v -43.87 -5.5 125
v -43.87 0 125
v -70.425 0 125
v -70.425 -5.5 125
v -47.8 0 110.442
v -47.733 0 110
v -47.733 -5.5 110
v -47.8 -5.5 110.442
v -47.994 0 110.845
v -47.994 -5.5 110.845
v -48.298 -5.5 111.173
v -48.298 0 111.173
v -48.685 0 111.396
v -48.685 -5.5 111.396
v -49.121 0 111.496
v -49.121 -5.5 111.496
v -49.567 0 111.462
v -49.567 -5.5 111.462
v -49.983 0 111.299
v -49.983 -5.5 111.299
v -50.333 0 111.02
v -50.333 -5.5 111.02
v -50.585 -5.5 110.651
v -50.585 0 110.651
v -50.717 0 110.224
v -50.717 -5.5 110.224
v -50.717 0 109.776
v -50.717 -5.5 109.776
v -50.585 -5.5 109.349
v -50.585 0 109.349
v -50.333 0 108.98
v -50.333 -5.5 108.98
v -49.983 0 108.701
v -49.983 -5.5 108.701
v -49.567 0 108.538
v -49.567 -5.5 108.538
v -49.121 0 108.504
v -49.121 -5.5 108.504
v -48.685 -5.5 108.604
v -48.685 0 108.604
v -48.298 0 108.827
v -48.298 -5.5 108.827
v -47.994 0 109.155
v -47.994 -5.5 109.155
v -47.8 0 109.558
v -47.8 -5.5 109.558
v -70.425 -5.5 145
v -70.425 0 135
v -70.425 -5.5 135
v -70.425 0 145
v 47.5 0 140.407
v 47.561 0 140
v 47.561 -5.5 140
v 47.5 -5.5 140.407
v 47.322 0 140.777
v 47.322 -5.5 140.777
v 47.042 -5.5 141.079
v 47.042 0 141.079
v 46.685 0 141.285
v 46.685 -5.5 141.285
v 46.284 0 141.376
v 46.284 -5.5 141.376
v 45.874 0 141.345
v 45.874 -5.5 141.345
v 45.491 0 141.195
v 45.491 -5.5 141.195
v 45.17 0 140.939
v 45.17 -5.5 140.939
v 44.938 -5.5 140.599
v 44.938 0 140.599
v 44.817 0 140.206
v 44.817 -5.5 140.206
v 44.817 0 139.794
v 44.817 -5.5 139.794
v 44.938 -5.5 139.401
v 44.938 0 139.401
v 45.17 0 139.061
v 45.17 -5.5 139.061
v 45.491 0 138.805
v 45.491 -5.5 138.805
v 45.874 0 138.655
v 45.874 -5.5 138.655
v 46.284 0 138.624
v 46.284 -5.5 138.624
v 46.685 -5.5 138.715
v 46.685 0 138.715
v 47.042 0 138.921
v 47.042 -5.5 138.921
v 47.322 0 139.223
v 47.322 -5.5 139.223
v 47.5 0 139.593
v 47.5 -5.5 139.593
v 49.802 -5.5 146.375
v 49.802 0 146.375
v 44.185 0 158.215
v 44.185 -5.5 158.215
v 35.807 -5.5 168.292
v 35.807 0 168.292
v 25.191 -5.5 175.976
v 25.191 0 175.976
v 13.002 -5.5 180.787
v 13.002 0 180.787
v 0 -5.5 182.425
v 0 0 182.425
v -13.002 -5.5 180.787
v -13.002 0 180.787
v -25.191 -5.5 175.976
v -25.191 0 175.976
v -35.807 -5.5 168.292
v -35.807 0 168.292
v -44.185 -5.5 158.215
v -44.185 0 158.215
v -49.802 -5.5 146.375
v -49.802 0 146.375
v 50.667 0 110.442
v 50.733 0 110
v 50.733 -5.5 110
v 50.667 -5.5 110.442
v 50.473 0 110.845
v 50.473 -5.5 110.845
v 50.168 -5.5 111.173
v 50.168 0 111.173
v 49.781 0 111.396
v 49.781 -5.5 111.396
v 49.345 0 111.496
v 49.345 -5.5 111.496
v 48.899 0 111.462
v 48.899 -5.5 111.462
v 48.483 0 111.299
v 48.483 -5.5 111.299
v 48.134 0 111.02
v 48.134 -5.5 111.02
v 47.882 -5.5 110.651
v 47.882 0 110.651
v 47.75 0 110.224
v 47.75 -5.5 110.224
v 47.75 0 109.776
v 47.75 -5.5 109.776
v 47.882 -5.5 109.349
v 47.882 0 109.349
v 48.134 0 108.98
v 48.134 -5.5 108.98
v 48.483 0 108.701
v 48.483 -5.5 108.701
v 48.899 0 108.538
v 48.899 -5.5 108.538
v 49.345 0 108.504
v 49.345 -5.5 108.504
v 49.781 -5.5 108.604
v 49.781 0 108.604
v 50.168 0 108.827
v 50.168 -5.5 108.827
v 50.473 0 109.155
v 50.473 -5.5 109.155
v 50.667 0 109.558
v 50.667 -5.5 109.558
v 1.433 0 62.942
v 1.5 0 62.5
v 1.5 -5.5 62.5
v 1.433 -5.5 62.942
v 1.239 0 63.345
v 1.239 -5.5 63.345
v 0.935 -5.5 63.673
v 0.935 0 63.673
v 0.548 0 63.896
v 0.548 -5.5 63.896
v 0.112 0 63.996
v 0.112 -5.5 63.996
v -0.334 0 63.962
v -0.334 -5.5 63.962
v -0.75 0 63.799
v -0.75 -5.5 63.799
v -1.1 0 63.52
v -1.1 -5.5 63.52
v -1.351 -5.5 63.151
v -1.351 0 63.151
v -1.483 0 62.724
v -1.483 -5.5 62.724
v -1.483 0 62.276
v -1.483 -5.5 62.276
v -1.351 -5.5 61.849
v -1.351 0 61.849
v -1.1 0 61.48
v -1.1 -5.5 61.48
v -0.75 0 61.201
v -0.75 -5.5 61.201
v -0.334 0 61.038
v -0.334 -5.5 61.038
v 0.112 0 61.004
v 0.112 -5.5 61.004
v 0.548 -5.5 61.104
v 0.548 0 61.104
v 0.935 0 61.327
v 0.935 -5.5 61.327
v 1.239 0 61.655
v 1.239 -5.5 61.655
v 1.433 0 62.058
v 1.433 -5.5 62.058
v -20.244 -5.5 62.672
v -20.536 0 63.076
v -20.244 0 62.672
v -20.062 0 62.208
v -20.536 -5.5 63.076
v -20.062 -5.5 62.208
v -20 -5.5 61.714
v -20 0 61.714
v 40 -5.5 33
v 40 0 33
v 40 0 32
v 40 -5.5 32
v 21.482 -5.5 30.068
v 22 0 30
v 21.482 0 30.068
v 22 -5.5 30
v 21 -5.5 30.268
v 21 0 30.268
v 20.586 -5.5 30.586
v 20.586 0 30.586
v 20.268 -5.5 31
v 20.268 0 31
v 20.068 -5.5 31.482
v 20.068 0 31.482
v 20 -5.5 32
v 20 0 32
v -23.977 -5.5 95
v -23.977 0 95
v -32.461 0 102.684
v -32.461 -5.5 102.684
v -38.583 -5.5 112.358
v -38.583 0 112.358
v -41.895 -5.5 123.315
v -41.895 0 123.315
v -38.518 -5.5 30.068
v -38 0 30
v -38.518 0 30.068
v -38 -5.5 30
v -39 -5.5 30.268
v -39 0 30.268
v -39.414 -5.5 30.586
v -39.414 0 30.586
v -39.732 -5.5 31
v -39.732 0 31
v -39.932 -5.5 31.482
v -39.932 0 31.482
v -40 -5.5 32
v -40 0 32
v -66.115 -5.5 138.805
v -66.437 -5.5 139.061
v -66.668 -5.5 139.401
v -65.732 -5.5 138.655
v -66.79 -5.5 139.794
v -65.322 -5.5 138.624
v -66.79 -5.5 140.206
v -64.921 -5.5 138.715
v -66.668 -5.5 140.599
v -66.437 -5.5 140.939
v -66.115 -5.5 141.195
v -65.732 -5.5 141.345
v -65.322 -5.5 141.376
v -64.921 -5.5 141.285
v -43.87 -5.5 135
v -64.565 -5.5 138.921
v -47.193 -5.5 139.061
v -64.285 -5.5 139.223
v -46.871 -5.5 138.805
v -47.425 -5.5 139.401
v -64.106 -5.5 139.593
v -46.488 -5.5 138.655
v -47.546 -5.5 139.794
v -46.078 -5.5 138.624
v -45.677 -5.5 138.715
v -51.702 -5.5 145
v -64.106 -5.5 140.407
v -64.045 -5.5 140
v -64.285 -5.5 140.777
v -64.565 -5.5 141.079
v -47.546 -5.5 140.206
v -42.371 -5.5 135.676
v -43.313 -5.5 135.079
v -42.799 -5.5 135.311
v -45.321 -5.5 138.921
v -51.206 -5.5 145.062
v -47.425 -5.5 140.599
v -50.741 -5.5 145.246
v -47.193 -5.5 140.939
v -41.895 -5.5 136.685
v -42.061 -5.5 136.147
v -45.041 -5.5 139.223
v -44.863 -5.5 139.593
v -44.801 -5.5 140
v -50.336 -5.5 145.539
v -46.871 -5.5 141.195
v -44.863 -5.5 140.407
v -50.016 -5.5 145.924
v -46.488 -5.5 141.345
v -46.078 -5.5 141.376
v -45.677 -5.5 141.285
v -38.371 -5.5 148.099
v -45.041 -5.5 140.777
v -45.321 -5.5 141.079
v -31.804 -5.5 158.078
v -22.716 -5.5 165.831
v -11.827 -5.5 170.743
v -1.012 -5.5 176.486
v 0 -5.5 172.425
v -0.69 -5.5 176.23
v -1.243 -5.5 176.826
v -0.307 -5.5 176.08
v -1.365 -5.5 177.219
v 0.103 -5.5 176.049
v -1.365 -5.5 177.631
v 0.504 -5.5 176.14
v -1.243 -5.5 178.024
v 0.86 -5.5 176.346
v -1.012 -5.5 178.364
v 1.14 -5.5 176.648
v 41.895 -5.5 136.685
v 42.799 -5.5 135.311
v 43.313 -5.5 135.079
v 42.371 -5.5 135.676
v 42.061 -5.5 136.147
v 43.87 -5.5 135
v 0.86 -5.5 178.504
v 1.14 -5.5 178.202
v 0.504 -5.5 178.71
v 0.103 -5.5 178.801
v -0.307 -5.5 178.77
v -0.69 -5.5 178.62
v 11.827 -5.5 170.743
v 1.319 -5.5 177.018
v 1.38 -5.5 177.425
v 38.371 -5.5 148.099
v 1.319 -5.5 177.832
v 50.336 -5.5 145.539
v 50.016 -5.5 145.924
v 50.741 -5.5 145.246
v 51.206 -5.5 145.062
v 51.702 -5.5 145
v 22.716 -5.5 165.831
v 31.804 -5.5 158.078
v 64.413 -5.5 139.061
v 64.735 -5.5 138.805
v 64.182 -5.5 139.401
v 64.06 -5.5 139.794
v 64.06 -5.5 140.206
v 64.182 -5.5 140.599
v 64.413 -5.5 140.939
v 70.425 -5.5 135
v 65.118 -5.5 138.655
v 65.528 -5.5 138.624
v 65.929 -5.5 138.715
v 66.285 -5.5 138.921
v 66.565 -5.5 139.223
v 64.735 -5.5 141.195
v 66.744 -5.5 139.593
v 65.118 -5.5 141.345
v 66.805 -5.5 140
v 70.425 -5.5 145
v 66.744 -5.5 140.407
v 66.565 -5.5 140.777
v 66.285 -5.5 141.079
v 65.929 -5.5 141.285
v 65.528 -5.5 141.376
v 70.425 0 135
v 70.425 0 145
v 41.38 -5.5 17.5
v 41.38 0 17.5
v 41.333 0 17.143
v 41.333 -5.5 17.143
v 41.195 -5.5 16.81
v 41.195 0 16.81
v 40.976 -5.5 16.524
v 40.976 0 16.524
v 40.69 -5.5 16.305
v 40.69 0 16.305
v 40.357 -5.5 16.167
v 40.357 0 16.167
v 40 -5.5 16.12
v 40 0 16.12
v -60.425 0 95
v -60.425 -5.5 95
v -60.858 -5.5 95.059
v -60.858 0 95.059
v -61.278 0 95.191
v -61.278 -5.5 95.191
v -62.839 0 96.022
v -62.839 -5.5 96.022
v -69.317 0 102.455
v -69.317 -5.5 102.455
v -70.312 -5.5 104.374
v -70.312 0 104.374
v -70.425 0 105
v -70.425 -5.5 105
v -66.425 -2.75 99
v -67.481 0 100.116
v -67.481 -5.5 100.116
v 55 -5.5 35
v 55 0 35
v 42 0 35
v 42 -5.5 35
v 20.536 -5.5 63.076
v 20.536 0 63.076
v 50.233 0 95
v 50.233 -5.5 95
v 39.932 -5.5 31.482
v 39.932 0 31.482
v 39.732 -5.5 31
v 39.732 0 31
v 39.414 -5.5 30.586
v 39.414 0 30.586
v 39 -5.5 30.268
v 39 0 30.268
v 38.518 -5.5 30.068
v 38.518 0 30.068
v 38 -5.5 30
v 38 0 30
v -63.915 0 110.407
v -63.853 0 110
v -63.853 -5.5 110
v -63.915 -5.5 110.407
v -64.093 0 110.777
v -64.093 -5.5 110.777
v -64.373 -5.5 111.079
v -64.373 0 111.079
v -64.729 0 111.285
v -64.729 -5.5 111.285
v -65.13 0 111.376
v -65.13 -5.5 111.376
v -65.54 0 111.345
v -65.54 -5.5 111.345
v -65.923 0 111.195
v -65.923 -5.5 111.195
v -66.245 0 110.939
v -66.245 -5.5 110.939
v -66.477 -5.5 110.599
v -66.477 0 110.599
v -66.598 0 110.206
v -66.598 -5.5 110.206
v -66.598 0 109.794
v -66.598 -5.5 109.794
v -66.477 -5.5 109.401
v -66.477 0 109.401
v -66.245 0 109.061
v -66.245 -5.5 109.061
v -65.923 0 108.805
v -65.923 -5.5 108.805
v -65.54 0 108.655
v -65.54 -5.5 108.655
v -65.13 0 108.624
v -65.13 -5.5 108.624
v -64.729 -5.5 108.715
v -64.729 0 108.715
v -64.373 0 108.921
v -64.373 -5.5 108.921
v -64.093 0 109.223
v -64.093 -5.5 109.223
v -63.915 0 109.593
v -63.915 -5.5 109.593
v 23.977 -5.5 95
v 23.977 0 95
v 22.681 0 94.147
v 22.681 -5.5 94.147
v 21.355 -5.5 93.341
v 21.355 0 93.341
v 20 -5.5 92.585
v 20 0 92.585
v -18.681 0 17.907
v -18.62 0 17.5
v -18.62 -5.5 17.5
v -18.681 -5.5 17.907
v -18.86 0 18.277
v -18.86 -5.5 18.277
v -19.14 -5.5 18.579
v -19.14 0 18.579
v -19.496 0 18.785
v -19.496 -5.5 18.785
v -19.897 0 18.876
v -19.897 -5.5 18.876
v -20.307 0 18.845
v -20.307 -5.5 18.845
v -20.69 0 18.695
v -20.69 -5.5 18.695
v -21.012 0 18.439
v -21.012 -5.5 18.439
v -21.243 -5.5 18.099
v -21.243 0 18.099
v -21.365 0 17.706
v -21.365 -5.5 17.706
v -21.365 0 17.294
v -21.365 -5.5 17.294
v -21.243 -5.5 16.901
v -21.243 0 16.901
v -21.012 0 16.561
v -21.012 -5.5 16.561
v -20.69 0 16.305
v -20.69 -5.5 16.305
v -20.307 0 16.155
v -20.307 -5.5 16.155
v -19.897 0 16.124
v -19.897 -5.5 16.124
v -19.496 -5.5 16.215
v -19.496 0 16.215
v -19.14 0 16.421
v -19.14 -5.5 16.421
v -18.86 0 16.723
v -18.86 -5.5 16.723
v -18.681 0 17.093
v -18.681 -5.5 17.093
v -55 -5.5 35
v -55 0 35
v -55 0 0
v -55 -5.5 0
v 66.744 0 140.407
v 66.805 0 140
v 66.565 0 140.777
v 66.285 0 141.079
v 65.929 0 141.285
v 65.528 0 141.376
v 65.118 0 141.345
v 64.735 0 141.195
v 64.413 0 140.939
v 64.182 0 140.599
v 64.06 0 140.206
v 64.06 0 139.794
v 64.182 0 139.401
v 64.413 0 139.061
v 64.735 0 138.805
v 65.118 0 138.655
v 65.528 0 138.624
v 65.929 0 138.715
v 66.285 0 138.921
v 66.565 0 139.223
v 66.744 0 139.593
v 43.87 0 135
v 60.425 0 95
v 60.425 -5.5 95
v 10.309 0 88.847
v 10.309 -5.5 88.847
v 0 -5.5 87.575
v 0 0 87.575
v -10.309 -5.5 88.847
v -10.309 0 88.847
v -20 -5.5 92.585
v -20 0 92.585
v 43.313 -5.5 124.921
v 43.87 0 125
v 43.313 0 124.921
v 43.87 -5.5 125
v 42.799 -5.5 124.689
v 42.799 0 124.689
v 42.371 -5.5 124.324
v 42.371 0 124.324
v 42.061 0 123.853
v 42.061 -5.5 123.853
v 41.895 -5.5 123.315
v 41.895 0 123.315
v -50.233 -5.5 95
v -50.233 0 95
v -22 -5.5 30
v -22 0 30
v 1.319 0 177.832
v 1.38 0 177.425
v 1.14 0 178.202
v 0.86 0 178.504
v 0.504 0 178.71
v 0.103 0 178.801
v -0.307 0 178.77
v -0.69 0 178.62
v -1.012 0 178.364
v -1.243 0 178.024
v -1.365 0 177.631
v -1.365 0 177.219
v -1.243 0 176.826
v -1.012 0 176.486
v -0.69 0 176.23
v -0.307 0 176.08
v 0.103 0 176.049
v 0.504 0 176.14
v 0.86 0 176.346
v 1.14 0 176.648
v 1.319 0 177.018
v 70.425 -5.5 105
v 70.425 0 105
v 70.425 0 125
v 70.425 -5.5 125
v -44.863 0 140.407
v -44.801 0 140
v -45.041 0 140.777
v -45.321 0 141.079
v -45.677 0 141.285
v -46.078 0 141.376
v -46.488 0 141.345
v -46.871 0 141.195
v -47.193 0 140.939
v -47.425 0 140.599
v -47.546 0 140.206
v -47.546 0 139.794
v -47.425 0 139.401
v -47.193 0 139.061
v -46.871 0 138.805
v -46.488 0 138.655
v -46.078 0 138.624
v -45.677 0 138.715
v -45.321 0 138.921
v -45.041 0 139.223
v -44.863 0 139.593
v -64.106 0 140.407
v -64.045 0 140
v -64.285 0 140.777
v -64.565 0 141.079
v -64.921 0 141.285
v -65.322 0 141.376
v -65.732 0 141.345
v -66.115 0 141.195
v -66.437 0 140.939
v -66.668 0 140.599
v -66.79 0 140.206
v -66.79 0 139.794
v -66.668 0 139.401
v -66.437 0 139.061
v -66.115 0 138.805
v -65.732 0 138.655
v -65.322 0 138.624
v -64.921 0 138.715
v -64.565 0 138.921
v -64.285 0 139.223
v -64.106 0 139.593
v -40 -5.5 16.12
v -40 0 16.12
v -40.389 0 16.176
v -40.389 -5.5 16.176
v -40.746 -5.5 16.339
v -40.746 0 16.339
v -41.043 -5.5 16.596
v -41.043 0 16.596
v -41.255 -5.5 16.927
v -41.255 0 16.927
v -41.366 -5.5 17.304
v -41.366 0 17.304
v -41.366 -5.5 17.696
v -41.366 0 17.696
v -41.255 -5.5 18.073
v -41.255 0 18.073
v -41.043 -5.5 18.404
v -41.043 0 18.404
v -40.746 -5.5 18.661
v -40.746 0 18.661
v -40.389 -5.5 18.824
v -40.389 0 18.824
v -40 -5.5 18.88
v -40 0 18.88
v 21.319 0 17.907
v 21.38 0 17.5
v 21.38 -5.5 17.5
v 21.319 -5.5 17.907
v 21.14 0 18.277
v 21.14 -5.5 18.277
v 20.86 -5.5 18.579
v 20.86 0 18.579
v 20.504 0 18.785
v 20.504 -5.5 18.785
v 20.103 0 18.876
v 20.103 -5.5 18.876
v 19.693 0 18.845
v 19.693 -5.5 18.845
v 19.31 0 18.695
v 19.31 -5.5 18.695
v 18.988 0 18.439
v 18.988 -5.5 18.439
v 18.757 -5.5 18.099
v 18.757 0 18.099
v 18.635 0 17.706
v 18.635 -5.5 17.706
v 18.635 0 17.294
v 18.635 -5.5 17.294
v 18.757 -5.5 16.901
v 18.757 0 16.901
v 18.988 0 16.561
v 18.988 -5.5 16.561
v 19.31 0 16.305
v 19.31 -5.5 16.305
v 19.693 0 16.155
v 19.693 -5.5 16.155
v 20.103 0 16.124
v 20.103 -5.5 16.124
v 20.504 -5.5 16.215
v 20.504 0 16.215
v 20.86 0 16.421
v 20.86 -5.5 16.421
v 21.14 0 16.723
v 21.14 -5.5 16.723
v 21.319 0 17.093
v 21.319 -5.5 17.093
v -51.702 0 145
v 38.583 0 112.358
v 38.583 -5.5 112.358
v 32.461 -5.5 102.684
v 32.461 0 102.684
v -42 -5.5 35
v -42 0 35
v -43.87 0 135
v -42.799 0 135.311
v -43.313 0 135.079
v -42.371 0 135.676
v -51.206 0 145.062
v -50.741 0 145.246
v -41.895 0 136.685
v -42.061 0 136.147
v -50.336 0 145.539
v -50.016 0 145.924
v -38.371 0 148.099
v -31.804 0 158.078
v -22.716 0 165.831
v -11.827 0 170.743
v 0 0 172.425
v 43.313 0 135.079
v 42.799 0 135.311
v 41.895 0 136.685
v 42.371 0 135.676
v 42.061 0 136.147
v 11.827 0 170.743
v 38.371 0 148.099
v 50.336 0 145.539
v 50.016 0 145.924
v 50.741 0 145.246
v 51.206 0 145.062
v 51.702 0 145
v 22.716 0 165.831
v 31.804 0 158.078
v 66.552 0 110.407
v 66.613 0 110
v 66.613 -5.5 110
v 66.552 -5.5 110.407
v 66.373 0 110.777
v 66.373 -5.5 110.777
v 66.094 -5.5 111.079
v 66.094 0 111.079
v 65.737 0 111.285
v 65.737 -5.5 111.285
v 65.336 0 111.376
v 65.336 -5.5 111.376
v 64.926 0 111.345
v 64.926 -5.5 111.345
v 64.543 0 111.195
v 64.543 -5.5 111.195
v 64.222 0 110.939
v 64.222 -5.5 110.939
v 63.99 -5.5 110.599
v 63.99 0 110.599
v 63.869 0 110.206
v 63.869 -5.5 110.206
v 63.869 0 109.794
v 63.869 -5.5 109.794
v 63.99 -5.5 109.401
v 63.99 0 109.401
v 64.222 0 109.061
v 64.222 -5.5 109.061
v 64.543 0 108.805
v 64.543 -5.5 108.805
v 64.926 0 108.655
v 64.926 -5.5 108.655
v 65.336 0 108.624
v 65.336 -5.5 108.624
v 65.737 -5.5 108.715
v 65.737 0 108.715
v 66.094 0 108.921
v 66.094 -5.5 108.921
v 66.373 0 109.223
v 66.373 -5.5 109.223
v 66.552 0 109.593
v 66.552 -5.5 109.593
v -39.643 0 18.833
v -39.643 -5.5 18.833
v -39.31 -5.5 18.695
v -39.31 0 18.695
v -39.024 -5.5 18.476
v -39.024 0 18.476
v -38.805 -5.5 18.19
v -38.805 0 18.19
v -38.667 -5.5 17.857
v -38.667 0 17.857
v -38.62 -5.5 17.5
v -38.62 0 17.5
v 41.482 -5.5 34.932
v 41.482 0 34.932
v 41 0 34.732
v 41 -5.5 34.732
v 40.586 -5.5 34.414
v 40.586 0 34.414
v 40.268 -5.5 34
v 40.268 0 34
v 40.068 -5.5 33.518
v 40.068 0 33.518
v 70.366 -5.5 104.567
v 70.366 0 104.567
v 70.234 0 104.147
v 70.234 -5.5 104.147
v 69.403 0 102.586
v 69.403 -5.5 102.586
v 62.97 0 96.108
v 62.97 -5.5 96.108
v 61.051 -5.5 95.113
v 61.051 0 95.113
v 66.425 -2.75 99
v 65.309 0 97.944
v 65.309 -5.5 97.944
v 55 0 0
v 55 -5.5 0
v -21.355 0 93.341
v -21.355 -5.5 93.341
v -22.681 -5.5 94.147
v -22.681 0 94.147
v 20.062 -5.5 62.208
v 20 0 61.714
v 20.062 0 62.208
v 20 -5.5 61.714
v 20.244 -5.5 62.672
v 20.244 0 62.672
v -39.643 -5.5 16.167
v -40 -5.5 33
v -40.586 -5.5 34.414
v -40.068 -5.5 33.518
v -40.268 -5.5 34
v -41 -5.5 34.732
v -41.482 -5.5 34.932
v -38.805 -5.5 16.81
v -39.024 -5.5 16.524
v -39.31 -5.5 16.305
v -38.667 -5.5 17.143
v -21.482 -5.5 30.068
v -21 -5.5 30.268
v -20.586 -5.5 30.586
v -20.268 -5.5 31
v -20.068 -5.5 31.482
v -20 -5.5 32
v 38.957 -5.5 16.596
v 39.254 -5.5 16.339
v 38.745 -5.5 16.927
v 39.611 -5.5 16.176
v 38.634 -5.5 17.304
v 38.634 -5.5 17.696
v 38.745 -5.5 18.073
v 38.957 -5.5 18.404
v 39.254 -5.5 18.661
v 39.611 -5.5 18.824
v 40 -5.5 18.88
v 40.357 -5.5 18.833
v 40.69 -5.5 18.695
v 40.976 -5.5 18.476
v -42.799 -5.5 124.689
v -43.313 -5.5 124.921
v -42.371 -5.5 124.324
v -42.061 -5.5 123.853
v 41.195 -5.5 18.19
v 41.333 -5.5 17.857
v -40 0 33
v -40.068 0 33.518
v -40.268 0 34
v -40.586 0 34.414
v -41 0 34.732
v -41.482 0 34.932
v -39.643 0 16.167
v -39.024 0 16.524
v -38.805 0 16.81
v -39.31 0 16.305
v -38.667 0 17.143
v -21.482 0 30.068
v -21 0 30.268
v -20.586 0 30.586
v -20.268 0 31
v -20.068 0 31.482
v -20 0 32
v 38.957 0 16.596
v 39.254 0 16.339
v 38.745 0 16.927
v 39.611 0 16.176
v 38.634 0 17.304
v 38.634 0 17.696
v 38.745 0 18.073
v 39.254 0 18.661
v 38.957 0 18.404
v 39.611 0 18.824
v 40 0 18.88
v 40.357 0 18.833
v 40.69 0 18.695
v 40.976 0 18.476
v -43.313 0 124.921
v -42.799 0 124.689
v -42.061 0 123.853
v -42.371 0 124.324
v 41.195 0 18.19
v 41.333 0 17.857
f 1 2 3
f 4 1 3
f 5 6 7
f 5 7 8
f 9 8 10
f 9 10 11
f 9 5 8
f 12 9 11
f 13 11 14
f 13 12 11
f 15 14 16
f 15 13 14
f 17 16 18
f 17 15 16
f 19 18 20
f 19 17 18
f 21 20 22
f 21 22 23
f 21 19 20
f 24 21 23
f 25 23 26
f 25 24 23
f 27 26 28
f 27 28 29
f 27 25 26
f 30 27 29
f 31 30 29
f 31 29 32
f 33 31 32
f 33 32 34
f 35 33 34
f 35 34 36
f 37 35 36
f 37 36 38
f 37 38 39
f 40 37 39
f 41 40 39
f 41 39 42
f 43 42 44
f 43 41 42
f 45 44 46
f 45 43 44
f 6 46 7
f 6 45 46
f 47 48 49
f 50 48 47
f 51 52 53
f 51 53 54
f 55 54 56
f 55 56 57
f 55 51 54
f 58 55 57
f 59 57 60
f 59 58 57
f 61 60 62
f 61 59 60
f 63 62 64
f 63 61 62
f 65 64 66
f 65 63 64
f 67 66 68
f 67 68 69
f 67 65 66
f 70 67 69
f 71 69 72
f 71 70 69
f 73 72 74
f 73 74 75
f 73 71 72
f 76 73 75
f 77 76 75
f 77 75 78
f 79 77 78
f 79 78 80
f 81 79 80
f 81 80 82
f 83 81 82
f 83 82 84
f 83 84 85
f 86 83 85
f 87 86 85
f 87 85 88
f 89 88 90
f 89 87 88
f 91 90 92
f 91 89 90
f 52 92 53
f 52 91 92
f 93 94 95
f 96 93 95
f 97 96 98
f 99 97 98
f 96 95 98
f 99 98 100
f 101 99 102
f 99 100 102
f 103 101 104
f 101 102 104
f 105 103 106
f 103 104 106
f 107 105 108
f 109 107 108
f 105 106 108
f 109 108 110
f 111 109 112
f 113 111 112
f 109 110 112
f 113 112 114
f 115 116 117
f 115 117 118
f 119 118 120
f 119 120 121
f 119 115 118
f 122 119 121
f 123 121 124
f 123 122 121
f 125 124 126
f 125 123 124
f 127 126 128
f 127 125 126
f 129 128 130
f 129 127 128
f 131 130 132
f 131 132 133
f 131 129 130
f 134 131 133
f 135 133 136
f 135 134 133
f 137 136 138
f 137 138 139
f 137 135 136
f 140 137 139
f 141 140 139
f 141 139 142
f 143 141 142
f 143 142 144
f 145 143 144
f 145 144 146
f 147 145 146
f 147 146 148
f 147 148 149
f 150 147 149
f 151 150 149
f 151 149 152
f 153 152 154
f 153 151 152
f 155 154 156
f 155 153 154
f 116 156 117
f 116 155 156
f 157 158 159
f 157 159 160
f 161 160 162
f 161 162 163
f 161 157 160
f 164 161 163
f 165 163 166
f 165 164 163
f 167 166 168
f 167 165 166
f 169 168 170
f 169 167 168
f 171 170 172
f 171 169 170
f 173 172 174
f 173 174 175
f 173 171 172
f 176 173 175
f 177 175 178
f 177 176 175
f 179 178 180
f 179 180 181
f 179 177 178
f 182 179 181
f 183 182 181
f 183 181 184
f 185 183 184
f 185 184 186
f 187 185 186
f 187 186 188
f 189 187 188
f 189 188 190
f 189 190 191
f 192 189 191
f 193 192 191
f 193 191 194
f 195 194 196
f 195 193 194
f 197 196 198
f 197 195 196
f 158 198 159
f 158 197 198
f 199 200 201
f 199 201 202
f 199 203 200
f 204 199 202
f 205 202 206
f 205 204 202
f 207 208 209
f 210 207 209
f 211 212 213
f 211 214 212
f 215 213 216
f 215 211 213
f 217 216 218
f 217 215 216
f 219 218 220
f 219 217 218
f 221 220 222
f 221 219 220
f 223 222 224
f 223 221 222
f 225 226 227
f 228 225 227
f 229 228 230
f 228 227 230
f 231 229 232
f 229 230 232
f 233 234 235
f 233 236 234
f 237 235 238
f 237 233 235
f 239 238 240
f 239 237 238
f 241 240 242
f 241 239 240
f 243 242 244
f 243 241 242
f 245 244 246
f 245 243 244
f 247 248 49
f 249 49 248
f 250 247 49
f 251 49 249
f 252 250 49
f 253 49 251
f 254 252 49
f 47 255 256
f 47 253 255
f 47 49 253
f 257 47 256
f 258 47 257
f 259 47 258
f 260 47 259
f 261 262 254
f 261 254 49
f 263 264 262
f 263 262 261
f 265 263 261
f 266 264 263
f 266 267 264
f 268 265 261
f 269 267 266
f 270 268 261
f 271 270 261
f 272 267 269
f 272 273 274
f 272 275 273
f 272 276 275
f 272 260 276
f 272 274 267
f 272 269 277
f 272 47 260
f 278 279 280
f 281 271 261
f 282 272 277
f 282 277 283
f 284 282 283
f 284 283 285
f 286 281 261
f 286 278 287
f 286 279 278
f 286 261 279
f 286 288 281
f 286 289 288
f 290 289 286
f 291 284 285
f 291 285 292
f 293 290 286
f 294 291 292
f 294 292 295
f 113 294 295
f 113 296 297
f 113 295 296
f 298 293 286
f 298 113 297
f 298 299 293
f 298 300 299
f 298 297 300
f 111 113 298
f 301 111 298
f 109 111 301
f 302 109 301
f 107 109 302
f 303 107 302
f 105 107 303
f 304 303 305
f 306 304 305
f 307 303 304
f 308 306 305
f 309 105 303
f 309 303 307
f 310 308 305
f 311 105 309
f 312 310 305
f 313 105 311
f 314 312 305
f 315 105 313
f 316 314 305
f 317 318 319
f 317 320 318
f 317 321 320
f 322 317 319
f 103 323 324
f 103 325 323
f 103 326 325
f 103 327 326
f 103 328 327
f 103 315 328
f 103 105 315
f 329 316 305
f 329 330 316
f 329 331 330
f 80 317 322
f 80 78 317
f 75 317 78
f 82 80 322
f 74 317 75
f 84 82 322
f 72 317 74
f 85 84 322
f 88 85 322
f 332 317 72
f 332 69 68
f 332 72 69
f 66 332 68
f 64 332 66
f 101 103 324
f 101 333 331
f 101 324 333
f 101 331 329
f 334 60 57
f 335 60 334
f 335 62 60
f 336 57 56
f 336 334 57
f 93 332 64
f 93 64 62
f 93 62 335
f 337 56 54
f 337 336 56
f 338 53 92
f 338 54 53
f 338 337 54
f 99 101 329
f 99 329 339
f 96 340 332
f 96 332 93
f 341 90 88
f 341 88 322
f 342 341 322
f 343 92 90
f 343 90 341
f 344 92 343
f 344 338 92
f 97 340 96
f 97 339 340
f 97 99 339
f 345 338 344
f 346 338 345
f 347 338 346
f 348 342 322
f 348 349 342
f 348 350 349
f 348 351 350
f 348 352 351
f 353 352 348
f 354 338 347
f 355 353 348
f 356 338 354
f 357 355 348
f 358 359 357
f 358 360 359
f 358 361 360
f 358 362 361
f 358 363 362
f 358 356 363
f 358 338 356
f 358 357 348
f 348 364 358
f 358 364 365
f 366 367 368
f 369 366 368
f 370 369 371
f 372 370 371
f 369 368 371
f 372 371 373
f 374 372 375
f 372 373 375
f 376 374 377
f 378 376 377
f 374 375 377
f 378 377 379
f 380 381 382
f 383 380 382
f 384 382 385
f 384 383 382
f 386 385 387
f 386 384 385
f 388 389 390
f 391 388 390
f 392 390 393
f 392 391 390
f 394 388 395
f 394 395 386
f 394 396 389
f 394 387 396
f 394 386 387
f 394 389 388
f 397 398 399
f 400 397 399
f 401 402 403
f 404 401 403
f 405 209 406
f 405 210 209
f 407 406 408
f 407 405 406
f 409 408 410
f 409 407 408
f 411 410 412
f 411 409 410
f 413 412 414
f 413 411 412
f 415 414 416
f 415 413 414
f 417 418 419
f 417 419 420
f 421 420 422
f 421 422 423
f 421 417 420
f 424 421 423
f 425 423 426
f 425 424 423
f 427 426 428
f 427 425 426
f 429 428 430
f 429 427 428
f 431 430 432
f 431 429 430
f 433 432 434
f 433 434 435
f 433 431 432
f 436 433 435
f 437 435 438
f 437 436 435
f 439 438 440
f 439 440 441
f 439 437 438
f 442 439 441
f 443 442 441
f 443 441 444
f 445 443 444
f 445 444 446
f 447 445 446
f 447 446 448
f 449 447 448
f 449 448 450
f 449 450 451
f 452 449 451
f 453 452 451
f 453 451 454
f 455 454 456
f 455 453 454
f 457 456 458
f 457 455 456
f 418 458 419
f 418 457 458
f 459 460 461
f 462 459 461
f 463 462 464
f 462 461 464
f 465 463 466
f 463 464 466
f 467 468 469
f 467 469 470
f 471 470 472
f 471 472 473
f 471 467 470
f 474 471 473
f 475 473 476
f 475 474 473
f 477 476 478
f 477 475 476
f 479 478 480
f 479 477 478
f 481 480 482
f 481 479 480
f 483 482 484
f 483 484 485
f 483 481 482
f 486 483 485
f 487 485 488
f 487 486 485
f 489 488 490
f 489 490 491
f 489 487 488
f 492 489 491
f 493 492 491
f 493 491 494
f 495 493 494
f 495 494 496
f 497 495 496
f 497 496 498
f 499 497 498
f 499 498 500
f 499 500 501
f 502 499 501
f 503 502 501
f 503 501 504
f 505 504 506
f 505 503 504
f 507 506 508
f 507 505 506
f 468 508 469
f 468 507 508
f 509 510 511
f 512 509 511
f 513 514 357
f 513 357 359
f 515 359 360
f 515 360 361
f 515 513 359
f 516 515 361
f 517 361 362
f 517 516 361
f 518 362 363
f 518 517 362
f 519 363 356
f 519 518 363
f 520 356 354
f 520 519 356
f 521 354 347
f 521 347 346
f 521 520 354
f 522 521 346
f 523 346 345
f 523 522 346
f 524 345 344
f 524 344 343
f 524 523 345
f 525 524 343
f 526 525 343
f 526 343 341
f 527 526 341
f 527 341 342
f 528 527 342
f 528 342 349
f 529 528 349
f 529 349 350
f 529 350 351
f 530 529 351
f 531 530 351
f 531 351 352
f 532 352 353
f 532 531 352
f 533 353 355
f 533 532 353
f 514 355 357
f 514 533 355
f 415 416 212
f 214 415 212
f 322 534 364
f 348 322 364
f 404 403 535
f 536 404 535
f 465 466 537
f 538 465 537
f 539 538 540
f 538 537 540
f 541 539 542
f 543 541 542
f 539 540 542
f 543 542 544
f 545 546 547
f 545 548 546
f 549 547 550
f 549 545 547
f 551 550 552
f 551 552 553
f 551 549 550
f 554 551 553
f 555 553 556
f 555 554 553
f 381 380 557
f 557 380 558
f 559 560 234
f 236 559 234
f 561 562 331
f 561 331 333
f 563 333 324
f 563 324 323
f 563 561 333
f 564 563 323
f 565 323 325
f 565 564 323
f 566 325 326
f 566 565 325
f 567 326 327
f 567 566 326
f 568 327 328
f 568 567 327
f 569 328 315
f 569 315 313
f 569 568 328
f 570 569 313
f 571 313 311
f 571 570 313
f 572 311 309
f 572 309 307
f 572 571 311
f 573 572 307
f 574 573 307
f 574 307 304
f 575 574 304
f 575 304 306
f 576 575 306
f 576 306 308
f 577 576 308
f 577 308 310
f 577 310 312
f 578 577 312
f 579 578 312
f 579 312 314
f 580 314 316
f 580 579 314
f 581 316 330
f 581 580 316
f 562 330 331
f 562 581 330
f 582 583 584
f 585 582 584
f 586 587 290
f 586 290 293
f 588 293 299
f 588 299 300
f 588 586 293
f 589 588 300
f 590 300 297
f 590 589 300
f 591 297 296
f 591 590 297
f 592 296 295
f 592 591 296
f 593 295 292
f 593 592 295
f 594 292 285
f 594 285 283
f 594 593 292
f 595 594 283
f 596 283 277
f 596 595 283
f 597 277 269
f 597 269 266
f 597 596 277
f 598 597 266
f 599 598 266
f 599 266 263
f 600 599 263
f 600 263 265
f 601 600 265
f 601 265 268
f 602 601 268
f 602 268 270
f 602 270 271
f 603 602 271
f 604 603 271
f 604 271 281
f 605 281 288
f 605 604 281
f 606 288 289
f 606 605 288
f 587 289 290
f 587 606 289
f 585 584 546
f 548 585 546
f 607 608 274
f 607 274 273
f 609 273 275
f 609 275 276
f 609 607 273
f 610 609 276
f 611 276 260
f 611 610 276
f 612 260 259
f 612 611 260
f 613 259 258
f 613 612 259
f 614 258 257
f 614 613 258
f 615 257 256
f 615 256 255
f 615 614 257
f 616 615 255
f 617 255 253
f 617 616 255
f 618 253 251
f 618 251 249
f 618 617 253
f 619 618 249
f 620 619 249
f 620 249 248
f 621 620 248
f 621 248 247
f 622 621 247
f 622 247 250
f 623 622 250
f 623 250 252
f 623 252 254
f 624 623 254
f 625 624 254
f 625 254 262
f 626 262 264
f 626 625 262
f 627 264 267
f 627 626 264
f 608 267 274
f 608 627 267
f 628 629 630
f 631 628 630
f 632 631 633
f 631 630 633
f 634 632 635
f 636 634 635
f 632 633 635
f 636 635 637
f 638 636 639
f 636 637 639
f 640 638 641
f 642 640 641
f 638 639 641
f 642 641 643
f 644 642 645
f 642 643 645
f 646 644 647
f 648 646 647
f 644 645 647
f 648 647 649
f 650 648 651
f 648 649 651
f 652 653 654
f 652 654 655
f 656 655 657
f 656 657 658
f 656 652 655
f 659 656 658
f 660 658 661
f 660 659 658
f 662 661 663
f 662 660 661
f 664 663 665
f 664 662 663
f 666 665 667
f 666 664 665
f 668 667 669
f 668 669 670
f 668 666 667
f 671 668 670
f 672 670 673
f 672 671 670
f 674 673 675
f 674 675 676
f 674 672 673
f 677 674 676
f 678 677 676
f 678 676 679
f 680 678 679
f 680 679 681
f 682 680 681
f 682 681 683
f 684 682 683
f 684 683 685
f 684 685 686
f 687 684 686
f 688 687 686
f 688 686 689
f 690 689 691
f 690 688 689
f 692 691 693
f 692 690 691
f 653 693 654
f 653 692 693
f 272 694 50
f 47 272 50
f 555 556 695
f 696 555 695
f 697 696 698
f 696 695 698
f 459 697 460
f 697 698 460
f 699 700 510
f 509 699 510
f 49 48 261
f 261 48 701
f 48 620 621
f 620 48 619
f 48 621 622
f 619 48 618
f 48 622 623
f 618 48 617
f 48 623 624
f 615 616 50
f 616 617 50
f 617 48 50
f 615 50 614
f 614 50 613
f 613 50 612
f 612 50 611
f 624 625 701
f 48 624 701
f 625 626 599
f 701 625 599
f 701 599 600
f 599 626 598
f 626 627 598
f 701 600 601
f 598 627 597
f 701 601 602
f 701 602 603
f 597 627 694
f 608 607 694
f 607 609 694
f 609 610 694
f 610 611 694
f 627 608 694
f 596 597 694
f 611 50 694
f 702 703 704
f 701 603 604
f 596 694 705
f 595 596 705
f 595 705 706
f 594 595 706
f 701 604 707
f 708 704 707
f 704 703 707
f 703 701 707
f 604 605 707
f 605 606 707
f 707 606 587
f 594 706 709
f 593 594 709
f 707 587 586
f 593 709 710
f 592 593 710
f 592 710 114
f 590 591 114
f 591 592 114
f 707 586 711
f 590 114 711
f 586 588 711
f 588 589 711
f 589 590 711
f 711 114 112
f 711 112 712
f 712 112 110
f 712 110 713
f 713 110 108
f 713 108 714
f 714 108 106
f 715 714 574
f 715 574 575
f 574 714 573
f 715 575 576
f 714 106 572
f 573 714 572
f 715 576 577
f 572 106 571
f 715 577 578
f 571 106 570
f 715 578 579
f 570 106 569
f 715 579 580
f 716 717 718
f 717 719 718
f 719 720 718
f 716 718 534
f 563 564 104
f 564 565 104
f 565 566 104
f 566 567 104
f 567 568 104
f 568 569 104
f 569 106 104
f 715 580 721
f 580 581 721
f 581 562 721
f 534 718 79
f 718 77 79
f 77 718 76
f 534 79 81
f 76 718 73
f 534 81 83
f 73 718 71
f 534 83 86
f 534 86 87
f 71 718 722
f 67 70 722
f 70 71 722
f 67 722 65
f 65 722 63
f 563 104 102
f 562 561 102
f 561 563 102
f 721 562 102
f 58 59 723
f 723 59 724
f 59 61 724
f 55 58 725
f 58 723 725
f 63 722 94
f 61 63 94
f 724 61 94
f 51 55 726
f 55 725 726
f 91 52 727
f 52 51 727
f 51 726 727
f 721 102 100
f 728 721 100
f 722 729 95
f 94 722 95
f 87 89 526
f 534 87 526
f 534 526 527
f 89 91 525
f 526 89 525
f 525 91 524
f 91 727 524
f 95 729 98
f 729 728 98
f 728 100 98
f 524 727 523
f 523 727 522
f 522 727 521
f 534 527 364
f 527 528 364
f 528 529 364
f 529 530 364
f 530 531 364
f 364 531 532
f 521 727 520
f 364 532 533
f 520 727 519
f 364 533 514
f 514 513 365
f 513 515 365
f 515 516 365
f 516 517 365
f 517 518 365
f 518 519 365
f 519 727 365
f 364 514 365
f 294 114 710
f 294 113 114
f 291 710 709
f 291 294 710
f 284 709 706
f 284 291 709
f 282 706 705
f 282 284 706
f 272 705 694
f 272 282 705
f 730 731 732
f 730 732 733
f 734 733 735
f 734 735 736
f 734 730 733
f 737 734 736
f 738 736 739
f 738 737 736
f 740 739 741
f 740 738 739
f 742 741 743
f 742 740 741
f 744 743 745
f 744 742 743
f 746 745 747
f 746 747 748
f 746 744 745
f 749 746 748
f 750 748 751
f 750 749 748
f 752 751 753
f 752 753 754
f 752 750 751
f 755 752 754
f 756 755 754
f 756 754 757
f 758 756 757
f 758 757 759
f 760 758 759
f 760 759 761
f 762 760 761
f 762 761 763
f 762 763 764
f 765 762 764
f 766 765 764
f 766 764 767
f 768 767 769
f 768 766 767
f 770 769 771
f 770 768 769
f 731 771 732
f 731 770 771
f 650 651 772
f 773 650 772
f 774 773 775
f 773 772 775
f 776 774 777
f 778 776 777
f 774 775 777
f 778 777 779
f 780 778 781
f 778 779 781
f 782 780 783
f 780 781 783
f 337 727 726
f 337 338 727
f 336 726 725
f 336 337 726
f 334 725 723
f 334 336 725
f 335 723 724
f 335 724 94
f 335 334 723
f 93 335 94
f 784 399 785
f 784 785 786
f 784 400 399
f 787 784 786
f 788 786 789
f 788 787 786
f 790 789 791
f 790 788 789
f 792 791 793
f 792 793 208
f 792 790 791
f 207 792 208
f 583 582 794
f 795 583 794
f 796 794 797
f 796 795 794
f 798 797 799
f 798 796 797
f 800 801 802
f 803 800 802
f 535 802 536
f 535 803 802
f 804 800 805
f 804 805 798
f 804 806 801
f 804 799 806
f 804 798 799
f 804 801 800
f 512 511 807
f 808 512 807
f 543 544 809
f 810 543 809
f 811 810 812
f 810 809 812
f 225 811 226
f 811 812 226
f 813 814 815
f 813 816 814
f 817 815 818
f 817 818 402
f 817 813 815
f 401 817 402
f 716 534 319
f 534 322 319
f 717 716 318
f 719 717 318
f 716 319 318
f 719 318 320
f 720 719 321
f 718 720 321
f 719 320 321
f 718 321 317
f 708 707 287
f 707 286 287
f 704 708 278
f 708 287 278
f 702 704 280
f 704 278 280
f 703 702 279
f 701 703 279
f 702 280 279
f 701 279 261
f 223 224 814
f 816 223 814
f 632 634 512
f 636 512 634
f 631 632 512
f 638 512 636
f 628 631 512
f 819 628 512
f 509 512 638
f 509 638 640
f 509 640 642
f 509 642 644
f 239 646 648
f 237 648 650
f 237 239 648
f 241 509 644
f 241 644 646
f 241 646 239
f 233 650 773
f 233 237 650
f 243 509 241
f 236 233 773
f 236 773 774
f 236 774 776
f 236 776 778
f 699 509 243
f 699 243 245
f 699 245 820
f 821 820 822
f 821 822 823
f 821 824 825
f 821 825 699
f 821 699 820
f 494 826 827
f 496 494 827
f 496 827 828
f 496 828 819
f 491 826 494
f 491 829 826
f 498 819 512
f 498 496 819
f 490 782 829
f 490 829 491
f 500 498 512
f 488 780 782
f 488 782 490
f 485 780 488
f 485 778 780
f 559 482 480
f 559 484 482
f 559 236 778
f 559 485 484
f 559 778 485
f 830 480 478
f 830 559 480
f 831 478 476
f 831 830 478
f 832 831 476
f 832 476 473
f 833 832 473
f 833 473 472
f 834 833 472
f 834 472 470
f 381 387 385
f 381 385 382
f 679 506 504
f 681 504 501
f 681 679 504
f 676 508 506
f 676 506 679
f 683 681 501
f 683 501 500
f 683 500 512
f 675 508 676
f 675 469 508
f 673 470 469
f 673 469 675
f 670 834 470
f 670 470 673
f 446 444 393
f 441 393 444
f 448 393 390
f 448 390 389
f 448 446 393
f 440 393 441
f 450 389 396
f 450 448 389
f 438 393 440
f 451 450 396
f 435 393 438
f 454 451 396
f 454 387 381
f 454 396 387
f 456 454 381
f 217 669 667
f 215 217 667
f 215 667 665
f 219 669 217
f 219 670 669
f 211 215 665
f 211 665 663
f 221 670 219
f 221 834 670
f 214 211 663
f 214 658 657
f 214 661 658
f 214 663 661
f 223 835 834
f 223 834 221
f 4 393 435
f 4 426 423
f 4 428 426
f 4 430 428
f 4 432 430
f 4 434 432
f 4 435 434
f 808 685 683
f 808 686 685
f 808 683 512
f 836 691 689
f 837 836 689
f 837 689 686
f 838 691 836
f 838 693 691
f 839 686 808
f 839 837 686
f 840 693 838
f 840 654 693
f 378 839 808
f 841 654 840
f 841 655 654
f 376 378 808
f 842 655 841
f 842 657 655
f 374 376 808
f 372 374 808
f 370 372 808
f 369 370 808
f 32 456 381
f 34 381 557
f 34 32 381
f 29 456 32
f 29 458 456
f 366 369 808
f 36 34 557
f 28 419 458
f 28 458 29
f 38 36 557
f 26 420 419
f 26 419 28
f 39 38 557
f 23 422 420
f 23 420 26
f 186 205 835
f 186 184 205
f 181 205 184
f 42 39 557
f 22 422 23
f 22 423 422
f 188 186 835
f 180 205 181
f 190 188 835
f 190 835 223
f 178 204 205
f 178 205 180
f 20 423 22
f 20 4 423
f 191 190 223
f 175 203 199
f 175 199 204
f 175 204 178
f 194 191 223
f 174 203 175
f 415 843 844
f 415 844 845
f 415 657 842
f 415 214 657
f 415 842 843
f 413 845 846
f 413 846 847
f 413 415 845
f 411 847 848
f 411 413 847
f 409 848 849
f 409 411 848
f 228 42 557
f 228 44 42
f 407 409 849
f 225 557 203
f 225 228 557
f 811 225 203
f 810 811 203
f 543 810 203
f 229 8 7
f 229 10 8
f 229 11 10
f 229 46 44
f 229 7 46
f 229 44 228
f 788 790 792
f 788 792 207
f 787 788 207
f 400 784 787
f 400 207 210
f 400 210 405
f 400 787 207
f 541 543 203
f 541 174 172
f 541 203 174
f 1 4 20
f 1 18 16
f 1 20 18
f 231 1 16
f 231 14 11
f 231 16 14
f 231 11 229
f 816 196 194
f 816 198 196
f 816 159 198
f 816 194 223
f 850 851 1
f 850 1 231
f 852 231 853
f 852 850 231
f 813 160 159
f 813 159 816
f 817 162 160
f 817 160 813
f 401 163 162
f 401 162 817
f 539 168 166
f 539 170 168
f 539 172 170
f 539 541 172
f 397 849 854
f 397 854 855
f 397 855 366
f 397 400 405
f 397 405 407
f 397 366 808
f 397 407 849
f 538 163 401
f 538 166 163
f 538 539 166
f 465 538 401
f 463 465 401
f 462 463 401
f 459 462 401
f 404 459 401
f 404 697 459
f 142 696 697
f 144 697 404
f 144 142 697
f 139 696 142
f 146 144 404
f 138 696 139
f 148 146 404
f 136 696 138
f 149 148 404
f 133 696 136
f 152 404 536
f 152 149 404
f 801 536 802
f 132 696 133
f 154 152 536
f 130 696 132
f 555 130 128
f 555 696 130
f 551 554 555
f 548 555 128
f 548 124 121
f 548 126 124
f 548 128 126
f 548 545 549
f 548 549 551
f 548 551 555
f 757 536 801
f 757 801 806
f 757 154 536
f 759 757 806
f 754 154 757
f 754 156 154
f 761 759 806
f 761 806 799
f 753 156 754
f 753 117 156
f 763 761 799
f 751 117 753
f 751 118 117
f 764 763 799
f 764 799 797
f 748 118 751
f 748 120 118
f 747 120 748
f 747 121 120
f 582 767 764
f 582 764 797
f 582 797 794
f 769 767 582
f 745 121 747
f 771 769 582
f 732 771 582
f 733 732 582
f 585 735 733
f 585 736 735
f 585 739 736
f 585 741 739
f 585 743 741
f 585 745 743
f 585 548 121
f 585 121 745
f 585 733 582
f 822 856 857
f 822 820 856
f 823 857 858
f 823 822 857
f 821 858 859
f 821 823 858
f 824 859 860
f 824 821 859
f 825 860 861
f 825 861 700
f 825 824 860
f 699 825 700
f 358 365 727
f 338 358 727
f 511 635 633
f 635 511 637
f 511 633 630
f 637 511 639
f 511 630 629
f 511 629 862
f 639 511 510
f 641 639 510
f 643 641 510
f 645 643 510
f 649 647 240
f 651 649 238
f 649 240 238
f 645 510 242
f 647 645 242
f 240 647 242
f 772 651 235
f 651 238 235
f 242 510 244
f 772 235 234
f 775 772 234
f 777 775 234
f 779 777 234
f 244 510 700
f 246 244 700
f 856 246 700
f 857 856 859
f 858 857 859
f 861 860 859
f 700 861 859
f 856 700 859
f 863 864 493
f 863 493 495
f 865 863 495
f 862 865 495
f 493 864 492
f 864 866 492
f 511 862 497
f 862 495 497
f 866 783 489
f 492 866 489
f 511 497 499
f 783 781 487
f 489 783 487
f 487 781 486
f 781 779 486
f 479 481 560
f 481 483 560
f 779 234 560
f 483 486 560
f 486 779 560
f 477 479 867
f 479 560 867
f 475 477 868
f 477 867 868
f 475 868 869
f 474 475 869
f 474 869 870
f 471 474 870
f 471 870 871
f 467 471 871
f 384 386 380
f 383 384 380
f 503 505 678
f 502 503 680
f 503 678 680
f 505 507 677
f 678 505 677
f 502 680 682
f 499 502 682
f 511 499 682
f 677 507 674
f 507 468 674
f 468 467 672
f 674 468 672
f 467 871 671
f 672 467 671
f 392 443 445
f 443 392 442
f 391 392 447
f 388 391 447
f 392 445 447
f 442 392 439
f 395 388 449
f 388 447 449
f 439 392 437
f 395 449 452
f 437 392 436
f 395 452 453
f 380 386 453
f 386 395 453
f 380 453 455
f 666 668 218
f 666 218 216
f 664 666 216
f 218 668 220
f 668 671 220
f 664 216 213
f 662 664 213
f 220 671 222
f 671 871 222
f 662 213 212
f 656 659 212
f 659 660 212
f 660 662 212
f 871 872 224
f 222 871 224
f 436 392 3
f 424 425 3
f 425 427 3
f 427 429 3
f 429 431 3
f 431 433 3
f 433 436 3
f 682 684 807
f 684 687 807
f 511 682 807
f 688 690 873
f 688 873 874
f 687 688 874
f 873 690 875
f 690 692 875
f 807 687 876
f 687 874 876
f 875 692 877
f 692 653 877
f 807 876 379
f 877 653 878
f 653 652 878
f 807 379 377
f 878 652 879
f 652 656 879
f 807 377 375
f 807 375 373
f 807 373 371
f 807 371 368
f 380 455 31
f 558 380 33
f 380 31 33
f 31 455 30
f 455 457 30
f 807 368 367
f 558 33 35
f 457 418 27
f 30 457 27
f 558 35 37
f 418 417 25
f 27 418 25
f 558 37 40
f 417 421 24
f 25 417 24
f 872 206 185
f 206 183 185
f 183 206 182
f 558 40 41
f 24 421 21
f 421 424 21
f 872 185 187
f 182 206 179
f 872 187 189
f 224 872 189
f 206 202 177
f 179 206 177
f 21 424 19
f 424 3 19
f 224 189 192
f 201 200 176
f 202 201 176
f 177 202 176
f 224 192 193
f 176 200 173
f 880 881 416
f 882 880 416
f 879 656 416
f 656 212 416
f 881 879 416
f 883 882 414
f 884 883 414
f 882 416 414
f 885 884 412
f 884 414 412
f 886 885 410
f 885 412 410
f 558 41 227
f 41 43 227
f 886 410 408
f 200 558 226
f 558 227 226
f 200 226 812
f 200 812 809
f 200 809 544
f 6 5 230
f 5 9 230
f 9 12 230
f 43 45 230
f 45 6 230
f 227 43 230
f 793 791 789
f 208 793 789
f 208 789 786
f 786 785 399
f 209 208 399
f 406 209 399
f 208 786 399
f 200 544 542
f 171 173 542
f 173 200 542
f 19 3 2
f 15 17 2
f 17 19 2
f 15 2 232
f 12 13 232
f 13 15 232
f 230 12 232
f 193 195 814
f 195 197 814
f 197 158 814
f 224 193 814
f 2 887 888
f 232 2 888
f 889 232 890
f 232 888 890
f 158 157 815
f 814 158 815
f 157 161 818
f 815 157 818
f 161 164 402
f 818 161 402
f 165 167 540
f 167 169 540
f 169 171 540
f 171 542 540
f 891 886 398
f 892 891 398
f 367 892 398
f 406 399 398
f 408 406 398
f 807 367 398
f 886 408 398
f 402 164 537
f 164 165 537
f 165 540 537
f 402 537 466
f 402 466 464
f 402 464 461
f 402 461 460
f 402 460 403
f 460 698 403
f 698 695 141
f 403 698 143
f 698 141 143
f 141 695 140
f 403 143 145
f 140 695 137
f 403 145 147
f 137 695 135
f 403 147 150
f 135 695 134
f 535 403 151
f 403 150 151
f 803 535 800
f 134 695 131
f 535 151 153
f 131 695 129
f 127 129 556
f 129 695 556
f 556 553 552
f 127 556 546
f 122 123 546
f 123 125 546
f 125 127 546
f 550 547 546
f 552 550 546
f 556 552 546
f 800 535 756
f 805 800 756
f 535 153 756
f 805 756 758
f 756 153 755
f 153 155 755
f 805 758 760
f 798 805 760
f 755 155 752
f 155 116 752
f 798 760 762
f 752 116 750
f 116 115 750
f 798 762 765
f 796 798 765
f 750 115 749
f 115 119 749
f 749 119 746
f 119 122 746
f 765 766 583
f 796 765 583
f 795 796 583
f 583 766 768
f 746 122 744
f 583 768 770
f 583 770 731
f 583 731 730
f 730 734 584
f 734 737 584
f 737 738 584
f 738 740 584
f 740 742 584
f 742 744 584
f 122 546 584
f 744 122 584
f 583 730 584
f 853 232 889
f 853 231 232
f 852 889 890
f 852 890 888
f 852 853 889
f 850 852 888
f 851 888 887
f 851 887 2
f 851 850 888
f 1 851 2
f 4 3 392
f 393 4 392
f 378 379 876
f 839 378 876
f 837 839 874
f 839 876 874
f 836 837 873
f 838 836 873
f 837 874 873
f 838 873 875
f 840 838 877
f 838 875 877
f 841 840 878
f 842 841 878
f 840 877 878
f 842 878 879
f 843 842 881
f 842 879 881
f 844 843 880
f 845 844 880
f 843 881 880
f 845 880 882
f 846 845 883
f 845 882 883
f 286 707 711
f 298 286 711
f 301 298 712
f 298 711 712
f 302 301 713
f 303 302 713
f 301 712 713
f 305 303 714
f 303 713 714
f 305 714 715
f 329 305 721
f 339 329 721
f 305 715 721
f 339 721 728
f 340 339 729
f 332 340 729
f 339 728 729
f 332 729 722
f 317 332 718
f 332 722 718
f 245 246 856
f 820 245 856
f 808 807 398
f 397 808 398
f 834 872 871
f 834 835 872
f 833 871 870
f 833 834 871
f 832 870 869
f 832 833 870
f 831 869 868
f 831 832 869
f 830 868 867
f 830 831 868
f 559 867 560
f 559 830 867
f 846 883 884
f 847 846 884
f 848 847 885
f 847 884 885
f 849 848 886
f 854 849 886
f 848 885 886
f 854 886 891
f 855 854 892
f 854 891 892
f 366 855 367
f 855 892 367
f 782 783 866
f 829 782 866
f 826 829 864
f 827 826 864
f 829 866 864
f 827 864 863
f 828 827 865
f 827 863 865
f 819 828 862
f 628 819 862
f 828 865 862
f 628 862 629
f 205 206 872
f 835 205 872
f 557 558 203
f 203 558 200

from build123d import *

# Parameters (mm, degrees)
F0_W        = 3.1917378622
F0_H        = 20
F0_R        = 1.5
F0_W_2      = 4.8082621378
F0_R_2      = 1.38
F0_H_2      = 10
F1_DEPTH    = 5.5
F0_W_3      = 10
F2_R        = 2
F2_2_R      = 2
F3_T1_DEPTH = 55.5


# Not quite as in the source:
# - a fillet or chamfer that OpenCascade refuses, or shapes differently, is made with other operations: its cross-section is extruded or revolved along the edge and cut away or added


with BuildPart() as f1:
    # F0 (on Front) → F1 (new body)
    with BuildSketch(Plane.XZ):
        with Locations((-58.8291310689, 115)):
            Rectangle(F0_W, F0_H)
        with BuildLine():
            Line((-52.425, 95), (-50.2332621378, 95))
            Line((-50.2332621378, 95), (-23.9766683465, 95))
            ThreePointArc((-23.9766683465, 95), (-36.2973941829, 108.0368535831), (-42.1293321215, 125))
            Line((-42.1293321215, 125), (-52.425, 125))
            Line((-52.425, 125), (-52.425, 105))
            Line((-52.425, 105), (-52.425, 95))
        make_face()
        with Locations((-49.2332621378, 110)):
            Circle(F0_R, mode=Mode.SUBTRACT)
        with Locations((58.8291310689, 115)):
            Rectangle(F0_W, F0_H)
        with Locations((54.8291310689, 115)):
            Rectangle(F0_W_2, F0_H)
        with BuildLine():
            Line((-20, 62.5), (-20, 30))
            Line((-20, 30), (20, 30))
            Line((20, 30), (20, 62.5))
            Line((20, 62.5), (20, 92.5850213818))
            ThreePointArc((20, 92.5850213818), (0, 87.575), (-20, 92.5850213818))
            Line((-20, 92.5850213818), (-20, 62.5))
        make_face()
        with Locations((0, 62.5)):
            Circle(F0_R, mode=Mode.SUBTRACT)
        Polygon((-30, 30), (-30, 0), (30, 0), (30, 30), (20, 30), (-20, 30), align=None)
        with Locations((-20, 17.5)):
            Circle(F0_R_2, mode=Mode.SUBTRACT)
        with Locations((20, 17.5)):
            Circle(F0_R_2, mode=Mode.SUBTRACT)
        Polygon((-70.425, 95), (-60.425, 95), (-60.425, 105), (-60.425, 125), (-70.425, 125), align=None)
        with Locations((-65.2332621378, 110)):
            Circle(F0_R_2, mode=Mode.SUBTRACT)
        with Locations((-58.8291310689, 100)):
            Rectangle(F0_W, F0_H_2)
        with Locations((-54.8291310689, 100)):
            Rectangle(F0_W_2, F0_H_2)
        with Locations((54.8291310689, 100)):
            Rectangle(F0_W_2, F0_H_2)
        with Locations((58.8291310689, 100)):
            Rectangle(F0_W, F0_H_2)
        Polygon((60.425, 105), (60.425, 95), (70.425, 95), (70.425, 125), (60.425, 125), align=None)
        with Locations((65.2332621378, 110)):
            Circle(F0_R_2, mode=Mode.SUBTRACT)
        with BuildLine():
            Line((-40, 16.12), (-40, 0))
            Line((-40, 0), (-30, 0))
            Line((-30, 0), (-30, 30))
            Line((-30, 30), (-40, 30))
            Line((-40, 30), (-40, 18.88))
            ThreePointArc((-40, 18.88), (-39.024192642, 18.475807358), (-38.62, 17.5))
            ThreePointArc((-38.62, 17.5), (-39.024192642, 16.524192642), (-40, 16.12))
        make_face()
        with BuildLine():
            Line((-55, 0), (-40, 0))
            Line((-40, 0), (-40, 16.12))
            ThreePointArc((-40, 16.12), (-41.38, 17.5), (-40, 18.88))
            Line((-40, 18.88), (-40, 30))
            Line((-40, 30), (-40, 35))
            Line((-40, 35), (-55, 35))
            Line((-55, 35), (-55, 0))
        make_face()
        with BuildLine():
            Line((40, 16.12), (40, 0))
            Line((40, 0), (55, 0))
            Line((55, 0), (55, 35))
            Line((55, 35), (40, 35))
            Line((40, 35), (40, 30))
            Line((40, 30), (40, 18.88))
            ThreePointArc((40, 18.88), (40.975807358, 18.475807358), (41.38, 17.5))
            ThreePointArc((41.38, 17.5), (40.975807358, 16.524192642), (40, 16.12))
        make_face()
        with BuildLine():
            Line((30, 30), (30, 0))
            Line((30, 0), (40, 0))
            Line((40, 0), (40, 16.12))
            ThreePointArc((40, 16.12), (38.62, 17.5), (40, 18.88))
            Line((40, 18.88), (40, 30))
            Line((40, 30), (30, 30))
        make_face()
        with BuildLine():
            Line((20, 92.5850213818), (20, 62.5))
            Line((20, 62.5), (50.2332621378, 95))
            Line((50.2332621378, 95), (23.9766683465, 95))
            ThreePointArc((23.9766683465, 95), (22.0214638511, 93.7379571059), (20, 92.5850213818))
        make_face()
        with BuildLine():
            Line((-50.2332621378, 95), (-20, 62.5))
            Line((-20, 62.5), (-20, 92.5850213818))
            ThreePointArc((-20, 92.5850213818), (-22.0214638511, 93.7379571059), (-23.9766683465, 95))
            Line((-23.9766683465, 95), (-50.2332621378, 95))
        make_face()
        with BuildLine():
            Line((23.9766683465, 95), (50.2332621378, 95))
            Line((50.2332621378, 95), (52.425, 95))
            Line((52.425, 95), (52.425, 105))
            Line((52.425, 105), (52.425, 125))
            Line((52.425, 125), (42.1293321215, 125))
            ThreePointArc((42.1293321215, 125), (36.2973941829, 108.0368535831), (23.9766683465, 95))
        make_face()
        with Locations((49.2332621378, 110)):
            Circle(F0_R, mode=Mode.SUBTRACT)
        with Locations((-54.8291310689, 115)):
            Rectangle(F0_W_2, F0_H)
    extrude(amount=F1_DEPTH)

    # F2
    f2_edges = [f1.edges().sort_by_distance(p)[0] for p in [
        (-40, -2.75, 30),
        (-40, -2.75, 35),
        (-20, -2.75, 30),
        (20, -2.75, 30),
        (40, -2.75, 30),
        (40, -2.75, 35),
        (-42.129332, -2.75, 125),
        (42.129332, -2.75, 125),
        (-20, -2.75, 62.5),
        (20, -2.75, 62.5),
    ]]
    fillet(f2_edges, radius=F2_R)

    # F3: fillet of radius 10 on 2 edges, made by hand

    # F3_s2 → F3_t1 (cut)
    with BuildSketch(Plane.XZ.offset(-25)):
        with BuildLine():
            add(Edge.make_bspline(
                [(-60.425, 95), (-70.425, 95), (-70.425, 105)],
                knots=[0, 0, 0, 1, 1, 1], degree=2, weights=[1, 0.25, 1]))
            Line((-70.425, 105), (-70.425, 95))
            Line((-70.425, 95), (-60.425, 95))
        make_face()
        with BuildLine():
            add(Edge.make_bspline(
                [(70.425, 105), (70.425, 95), (60.425, 95)],
                knots=[0, 0, 0, 1, 1, 1], degree=2, weights=[1, 0.25, 1]))
            Line((60.425, 95), (70.425, 95))
            Line((70.425, 95), (70.425, 105))
        make_face()
    extrude(amount=F3_T1_DEPTH, mode=Mode.SUBTRACT)


with BuildPart() as f1b:
    # F0 (on Front) → F1, piece 2 (new body)
    with BuildSketch(Plane.XZ):
        with BuildLine():
            Line((42.1293321215, 135), (57.2332621378, 135))
            Line((57.2332621378, 135), (57.2332621378, 145))
            Line((57.2332621378, 145), (50.2332621378, 145))
            ThreePointArc((50.2332621378, 145), (0, 182.425), (-50.2332621378, 145))
            Line((-50.2332621378, 145), (-57.2332621378, 145))
            Line((-57.2332621378, 145), (-57.2332621378, 135))
            Line((-57.2332621378, 135), (-42.1293321215, 135))
            ThreePointArc((-42.1293321215, 135), (0, 172.425), (42.1293321215, 135))
        make_face()
        with Locations((-46.1812971296, 140)):
            Circle(F0_R_2, mode=Mode.SUBTRACT)
        with Locations((0, 177.425)):
            Circle(F0_R_2, mode=Mode.SUBTRACT)
        with Locations((46.1812971296, 140)):
            Circle(F0_R_2, mode=Mode.SUBTRACT)
        with Locations((58.8291310689, 140)):
            Rectangle(F0_W, F0_H_2)
        with Locations((-58.8291310689, 140)):
            Rectangle(F0_W, F0_H_2)
        with Locations((-65.425, 140)):
            Rectangle(F0_W_3, F0_H_2)
        with Locations((-65.425, 140)):
            Circle(F0_R_2, mode=Mode.SUBTRACT)
        with Locations((65.425, 140)):
            Rectangle(F0_W_3, F0_H_2)
        with Locations((65.425, 140)):
            Circle(F0_R_2, mode=Mode.SUBTRACT)
    extrude(amount=F1_DEPTH)

    # F2#2
    f2_2_edges = [f1b.edges().sort_by_distance(p)[0] for p in [
        (-50.233262, -2.75, 145),
        (50.233262, -2.75, 145),
        (-42.129332, -2.75, 135),
        (42.129332, -2.75, 135),
    ]]
    fillet(f2_2_edges, radius=F2_2_R)


solid = Compound([f1.part, f1b.part])
